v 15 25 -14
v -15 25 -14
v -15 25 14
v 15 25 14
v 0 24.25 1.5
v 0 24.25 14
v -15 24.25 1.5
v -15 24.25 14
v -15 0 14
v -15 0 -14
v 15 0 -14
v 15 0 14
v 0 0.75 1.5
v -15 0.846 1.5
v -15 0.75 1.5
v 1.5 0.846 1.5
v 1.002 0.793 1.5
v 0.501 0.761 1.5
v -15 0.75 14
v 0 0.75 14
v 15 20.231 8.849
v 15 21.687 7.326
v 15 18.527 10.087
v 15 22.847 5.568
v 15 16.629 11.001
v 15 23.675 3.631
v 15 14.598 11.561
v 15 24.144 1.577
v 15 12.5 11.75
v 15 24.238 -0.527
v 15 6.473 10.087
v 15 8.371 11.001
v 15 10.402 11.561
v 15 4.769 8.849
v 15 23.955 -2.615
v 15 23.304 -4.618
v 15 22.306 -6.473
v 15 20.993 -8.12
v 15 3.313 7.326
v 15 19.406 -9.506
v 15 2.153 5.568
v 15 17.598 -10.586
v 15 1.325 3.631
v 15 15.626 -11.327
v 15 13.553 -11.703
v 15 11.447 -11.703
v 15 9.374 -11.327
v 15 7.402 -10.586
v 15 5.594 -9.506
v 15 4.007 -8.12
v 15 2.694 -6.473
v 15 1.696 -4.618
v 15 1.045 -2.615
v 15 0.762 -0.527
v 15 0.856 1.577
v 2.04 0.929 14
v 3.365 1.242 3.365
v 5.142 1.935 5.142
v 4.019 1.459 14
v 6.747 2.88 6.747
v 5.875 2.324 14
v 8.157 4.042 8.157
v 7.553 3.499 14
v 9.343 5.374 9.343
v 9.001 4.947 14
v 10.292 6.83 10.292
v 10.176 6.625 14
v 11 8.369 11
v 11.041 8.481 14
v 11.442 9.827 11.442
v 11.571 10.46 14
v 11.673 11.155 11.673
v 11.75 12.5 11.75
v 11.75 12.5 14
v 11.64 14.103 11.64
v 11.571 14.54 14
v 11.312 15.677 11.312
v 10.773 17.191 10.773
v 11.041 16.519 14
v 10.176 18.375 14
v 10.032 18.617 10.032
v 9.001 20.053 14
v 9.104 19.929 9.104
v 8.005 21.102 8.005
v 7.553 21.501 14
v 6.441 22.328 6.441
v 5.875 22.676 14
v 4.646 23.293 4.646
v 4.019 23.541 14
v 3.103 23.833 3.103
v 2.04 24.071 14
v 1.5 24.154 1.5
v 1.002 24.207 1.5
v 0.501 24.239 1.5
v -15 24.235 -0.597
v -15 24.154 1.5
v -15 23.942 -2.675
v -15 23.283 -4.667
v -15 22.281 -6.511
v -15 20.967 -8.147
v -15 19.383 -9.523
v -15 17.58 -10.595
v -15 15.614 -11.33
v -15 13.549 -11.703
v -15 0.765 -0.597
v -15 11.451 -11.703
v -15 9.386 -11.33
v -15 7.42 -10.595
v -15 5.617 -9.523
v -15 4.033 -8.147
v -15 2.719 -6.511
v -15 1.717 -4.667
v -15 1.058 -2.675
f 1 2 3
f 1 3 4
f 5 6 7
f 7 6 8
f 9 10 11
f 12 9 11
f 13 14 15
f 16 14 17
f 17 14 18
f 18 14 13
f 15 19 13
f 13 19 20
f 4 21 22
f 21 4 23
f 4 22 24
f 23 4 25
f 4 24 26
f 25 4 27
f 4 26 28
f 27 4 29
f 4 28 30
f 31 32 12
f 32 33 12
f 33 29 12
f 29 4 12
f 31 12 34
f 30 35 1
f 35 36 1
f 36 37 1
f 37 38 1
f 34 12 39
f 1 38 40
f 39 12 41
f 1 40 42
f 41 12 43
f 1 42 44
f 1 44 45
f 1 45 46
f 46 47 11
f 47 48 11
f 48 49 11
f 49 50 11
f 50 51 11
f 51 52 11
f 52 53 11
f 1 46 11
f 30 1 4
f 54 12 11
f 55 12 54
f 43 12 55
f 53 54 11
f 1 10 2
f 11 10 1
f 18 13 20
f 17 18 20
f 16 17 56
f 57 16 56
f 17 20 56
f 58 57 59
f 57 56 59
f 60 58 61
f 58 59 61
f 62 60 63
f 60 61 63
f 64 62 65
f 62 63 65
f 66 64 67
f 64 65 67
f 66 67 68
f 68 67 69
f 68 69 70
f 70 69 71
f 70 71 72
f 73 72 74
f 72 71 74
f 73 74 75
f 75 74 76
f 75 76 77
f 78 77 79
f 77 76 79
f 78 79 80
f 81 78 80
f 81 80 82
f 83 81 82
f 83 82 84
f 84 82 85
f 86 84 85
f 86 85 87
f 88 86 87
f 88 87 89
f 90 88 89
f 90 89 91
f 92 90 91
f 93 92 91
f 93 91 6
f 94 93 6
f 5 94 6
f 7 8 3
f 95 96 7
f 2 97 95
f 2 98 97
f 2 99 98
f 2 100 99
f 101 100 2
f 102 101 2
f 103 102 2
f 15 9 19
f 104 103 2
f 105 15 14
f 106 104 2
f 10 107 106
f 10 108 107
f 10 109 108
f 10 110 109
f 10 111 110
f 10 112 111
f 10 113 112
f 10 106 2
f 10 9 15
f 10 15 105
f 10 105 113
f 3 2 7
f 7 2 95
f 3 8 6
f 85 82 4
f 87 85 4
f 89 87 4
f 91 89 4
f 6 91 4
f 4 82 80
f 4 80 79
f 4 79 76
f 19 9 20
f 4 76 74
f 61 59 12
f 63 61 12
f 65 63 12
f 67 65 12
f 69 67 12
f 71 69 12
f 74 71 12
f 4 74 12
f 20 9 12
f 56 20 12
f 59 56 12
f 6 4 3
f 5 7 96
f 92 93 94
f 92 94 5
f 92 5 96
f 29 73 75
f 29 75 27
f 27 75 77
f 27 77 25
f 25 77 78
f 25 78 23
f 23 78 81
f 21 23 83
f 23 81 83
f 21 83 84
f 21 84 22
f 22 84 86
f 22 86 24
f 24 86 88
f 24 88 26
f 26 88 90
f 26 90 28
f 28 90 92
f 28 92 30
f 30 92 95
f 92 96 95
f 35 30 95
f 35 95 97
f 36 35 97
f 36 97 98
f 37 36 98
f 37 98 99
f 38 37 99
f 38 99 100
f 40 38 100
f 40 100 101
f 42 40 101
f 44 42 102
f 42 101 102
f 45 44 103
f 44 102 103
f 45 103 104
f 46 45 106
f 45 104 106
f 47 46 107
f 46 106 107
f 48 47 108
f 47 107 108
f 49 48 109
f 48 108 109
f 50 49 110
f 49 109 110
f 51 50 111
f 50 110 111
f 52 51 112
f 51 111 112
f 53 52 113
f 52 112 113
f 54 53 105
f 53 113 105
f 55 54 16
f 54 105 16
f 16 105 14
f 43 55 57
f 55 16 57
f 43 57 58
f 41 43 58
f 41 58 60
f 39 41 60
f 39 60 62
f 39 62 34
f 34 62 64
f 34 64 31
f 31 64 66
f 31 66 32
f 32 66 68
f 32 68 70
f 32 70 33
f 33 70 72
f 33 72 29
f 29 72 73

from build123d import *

# Parameters (mm, degrees)
SKETCH1_W           = 30
SKETCH1_H           = 28
BOSS_EXTRUDE1_DEPTH = 25
SKETCH2_R           = 11.75
CUT_EXTRUDE1_DEPTH  = 42.484937025
CUT_EXTRUDE2_DEPTH  = 12.5


with BuildPart() as part:
    # Sketch1 → Boss-Extrude1 (new body)
    with BuildSketch(Plane(origin=(0, 0, 0), x_dir=(1, 0, 0), z_dir=(0, 1, 0))):
        Rectangle(SKETCH1_W, SKETCH1_H)
    extrude(amount=BOSS_EXTRUDE1_DEPTH)

    # Sketch2 → Cut-Extrude1 (cut, through all)
    with BuildSketch(Plane.ZY.offset(15)):
        with Locations((0, 12.5)):
            Circle(SKETCH2_R)
    extrude(amount=-CUT_EXTRUDE1_DEPTH, mode=Mode.SUBTRACT)

    # Sketch3 → Cut-Extrude2 (cut)
    with BuildSketch(Plane.XY.offset(14)):
        with BuildLine():
            Line((0, 24.25), (-15, 24.25))
            Line((-15, 24.25), (-15, 0.75))
            Line((-15, 0.75), (0, 0.75))
            ThreePointArc((0, 0.75), (11.75, 12.5), (0, 24.25))
        make_face()
    extrude(amount=-CUT_EXTRUDE2_DEPTH, mode=Mode.SUBTRACT)


solid = part.part
